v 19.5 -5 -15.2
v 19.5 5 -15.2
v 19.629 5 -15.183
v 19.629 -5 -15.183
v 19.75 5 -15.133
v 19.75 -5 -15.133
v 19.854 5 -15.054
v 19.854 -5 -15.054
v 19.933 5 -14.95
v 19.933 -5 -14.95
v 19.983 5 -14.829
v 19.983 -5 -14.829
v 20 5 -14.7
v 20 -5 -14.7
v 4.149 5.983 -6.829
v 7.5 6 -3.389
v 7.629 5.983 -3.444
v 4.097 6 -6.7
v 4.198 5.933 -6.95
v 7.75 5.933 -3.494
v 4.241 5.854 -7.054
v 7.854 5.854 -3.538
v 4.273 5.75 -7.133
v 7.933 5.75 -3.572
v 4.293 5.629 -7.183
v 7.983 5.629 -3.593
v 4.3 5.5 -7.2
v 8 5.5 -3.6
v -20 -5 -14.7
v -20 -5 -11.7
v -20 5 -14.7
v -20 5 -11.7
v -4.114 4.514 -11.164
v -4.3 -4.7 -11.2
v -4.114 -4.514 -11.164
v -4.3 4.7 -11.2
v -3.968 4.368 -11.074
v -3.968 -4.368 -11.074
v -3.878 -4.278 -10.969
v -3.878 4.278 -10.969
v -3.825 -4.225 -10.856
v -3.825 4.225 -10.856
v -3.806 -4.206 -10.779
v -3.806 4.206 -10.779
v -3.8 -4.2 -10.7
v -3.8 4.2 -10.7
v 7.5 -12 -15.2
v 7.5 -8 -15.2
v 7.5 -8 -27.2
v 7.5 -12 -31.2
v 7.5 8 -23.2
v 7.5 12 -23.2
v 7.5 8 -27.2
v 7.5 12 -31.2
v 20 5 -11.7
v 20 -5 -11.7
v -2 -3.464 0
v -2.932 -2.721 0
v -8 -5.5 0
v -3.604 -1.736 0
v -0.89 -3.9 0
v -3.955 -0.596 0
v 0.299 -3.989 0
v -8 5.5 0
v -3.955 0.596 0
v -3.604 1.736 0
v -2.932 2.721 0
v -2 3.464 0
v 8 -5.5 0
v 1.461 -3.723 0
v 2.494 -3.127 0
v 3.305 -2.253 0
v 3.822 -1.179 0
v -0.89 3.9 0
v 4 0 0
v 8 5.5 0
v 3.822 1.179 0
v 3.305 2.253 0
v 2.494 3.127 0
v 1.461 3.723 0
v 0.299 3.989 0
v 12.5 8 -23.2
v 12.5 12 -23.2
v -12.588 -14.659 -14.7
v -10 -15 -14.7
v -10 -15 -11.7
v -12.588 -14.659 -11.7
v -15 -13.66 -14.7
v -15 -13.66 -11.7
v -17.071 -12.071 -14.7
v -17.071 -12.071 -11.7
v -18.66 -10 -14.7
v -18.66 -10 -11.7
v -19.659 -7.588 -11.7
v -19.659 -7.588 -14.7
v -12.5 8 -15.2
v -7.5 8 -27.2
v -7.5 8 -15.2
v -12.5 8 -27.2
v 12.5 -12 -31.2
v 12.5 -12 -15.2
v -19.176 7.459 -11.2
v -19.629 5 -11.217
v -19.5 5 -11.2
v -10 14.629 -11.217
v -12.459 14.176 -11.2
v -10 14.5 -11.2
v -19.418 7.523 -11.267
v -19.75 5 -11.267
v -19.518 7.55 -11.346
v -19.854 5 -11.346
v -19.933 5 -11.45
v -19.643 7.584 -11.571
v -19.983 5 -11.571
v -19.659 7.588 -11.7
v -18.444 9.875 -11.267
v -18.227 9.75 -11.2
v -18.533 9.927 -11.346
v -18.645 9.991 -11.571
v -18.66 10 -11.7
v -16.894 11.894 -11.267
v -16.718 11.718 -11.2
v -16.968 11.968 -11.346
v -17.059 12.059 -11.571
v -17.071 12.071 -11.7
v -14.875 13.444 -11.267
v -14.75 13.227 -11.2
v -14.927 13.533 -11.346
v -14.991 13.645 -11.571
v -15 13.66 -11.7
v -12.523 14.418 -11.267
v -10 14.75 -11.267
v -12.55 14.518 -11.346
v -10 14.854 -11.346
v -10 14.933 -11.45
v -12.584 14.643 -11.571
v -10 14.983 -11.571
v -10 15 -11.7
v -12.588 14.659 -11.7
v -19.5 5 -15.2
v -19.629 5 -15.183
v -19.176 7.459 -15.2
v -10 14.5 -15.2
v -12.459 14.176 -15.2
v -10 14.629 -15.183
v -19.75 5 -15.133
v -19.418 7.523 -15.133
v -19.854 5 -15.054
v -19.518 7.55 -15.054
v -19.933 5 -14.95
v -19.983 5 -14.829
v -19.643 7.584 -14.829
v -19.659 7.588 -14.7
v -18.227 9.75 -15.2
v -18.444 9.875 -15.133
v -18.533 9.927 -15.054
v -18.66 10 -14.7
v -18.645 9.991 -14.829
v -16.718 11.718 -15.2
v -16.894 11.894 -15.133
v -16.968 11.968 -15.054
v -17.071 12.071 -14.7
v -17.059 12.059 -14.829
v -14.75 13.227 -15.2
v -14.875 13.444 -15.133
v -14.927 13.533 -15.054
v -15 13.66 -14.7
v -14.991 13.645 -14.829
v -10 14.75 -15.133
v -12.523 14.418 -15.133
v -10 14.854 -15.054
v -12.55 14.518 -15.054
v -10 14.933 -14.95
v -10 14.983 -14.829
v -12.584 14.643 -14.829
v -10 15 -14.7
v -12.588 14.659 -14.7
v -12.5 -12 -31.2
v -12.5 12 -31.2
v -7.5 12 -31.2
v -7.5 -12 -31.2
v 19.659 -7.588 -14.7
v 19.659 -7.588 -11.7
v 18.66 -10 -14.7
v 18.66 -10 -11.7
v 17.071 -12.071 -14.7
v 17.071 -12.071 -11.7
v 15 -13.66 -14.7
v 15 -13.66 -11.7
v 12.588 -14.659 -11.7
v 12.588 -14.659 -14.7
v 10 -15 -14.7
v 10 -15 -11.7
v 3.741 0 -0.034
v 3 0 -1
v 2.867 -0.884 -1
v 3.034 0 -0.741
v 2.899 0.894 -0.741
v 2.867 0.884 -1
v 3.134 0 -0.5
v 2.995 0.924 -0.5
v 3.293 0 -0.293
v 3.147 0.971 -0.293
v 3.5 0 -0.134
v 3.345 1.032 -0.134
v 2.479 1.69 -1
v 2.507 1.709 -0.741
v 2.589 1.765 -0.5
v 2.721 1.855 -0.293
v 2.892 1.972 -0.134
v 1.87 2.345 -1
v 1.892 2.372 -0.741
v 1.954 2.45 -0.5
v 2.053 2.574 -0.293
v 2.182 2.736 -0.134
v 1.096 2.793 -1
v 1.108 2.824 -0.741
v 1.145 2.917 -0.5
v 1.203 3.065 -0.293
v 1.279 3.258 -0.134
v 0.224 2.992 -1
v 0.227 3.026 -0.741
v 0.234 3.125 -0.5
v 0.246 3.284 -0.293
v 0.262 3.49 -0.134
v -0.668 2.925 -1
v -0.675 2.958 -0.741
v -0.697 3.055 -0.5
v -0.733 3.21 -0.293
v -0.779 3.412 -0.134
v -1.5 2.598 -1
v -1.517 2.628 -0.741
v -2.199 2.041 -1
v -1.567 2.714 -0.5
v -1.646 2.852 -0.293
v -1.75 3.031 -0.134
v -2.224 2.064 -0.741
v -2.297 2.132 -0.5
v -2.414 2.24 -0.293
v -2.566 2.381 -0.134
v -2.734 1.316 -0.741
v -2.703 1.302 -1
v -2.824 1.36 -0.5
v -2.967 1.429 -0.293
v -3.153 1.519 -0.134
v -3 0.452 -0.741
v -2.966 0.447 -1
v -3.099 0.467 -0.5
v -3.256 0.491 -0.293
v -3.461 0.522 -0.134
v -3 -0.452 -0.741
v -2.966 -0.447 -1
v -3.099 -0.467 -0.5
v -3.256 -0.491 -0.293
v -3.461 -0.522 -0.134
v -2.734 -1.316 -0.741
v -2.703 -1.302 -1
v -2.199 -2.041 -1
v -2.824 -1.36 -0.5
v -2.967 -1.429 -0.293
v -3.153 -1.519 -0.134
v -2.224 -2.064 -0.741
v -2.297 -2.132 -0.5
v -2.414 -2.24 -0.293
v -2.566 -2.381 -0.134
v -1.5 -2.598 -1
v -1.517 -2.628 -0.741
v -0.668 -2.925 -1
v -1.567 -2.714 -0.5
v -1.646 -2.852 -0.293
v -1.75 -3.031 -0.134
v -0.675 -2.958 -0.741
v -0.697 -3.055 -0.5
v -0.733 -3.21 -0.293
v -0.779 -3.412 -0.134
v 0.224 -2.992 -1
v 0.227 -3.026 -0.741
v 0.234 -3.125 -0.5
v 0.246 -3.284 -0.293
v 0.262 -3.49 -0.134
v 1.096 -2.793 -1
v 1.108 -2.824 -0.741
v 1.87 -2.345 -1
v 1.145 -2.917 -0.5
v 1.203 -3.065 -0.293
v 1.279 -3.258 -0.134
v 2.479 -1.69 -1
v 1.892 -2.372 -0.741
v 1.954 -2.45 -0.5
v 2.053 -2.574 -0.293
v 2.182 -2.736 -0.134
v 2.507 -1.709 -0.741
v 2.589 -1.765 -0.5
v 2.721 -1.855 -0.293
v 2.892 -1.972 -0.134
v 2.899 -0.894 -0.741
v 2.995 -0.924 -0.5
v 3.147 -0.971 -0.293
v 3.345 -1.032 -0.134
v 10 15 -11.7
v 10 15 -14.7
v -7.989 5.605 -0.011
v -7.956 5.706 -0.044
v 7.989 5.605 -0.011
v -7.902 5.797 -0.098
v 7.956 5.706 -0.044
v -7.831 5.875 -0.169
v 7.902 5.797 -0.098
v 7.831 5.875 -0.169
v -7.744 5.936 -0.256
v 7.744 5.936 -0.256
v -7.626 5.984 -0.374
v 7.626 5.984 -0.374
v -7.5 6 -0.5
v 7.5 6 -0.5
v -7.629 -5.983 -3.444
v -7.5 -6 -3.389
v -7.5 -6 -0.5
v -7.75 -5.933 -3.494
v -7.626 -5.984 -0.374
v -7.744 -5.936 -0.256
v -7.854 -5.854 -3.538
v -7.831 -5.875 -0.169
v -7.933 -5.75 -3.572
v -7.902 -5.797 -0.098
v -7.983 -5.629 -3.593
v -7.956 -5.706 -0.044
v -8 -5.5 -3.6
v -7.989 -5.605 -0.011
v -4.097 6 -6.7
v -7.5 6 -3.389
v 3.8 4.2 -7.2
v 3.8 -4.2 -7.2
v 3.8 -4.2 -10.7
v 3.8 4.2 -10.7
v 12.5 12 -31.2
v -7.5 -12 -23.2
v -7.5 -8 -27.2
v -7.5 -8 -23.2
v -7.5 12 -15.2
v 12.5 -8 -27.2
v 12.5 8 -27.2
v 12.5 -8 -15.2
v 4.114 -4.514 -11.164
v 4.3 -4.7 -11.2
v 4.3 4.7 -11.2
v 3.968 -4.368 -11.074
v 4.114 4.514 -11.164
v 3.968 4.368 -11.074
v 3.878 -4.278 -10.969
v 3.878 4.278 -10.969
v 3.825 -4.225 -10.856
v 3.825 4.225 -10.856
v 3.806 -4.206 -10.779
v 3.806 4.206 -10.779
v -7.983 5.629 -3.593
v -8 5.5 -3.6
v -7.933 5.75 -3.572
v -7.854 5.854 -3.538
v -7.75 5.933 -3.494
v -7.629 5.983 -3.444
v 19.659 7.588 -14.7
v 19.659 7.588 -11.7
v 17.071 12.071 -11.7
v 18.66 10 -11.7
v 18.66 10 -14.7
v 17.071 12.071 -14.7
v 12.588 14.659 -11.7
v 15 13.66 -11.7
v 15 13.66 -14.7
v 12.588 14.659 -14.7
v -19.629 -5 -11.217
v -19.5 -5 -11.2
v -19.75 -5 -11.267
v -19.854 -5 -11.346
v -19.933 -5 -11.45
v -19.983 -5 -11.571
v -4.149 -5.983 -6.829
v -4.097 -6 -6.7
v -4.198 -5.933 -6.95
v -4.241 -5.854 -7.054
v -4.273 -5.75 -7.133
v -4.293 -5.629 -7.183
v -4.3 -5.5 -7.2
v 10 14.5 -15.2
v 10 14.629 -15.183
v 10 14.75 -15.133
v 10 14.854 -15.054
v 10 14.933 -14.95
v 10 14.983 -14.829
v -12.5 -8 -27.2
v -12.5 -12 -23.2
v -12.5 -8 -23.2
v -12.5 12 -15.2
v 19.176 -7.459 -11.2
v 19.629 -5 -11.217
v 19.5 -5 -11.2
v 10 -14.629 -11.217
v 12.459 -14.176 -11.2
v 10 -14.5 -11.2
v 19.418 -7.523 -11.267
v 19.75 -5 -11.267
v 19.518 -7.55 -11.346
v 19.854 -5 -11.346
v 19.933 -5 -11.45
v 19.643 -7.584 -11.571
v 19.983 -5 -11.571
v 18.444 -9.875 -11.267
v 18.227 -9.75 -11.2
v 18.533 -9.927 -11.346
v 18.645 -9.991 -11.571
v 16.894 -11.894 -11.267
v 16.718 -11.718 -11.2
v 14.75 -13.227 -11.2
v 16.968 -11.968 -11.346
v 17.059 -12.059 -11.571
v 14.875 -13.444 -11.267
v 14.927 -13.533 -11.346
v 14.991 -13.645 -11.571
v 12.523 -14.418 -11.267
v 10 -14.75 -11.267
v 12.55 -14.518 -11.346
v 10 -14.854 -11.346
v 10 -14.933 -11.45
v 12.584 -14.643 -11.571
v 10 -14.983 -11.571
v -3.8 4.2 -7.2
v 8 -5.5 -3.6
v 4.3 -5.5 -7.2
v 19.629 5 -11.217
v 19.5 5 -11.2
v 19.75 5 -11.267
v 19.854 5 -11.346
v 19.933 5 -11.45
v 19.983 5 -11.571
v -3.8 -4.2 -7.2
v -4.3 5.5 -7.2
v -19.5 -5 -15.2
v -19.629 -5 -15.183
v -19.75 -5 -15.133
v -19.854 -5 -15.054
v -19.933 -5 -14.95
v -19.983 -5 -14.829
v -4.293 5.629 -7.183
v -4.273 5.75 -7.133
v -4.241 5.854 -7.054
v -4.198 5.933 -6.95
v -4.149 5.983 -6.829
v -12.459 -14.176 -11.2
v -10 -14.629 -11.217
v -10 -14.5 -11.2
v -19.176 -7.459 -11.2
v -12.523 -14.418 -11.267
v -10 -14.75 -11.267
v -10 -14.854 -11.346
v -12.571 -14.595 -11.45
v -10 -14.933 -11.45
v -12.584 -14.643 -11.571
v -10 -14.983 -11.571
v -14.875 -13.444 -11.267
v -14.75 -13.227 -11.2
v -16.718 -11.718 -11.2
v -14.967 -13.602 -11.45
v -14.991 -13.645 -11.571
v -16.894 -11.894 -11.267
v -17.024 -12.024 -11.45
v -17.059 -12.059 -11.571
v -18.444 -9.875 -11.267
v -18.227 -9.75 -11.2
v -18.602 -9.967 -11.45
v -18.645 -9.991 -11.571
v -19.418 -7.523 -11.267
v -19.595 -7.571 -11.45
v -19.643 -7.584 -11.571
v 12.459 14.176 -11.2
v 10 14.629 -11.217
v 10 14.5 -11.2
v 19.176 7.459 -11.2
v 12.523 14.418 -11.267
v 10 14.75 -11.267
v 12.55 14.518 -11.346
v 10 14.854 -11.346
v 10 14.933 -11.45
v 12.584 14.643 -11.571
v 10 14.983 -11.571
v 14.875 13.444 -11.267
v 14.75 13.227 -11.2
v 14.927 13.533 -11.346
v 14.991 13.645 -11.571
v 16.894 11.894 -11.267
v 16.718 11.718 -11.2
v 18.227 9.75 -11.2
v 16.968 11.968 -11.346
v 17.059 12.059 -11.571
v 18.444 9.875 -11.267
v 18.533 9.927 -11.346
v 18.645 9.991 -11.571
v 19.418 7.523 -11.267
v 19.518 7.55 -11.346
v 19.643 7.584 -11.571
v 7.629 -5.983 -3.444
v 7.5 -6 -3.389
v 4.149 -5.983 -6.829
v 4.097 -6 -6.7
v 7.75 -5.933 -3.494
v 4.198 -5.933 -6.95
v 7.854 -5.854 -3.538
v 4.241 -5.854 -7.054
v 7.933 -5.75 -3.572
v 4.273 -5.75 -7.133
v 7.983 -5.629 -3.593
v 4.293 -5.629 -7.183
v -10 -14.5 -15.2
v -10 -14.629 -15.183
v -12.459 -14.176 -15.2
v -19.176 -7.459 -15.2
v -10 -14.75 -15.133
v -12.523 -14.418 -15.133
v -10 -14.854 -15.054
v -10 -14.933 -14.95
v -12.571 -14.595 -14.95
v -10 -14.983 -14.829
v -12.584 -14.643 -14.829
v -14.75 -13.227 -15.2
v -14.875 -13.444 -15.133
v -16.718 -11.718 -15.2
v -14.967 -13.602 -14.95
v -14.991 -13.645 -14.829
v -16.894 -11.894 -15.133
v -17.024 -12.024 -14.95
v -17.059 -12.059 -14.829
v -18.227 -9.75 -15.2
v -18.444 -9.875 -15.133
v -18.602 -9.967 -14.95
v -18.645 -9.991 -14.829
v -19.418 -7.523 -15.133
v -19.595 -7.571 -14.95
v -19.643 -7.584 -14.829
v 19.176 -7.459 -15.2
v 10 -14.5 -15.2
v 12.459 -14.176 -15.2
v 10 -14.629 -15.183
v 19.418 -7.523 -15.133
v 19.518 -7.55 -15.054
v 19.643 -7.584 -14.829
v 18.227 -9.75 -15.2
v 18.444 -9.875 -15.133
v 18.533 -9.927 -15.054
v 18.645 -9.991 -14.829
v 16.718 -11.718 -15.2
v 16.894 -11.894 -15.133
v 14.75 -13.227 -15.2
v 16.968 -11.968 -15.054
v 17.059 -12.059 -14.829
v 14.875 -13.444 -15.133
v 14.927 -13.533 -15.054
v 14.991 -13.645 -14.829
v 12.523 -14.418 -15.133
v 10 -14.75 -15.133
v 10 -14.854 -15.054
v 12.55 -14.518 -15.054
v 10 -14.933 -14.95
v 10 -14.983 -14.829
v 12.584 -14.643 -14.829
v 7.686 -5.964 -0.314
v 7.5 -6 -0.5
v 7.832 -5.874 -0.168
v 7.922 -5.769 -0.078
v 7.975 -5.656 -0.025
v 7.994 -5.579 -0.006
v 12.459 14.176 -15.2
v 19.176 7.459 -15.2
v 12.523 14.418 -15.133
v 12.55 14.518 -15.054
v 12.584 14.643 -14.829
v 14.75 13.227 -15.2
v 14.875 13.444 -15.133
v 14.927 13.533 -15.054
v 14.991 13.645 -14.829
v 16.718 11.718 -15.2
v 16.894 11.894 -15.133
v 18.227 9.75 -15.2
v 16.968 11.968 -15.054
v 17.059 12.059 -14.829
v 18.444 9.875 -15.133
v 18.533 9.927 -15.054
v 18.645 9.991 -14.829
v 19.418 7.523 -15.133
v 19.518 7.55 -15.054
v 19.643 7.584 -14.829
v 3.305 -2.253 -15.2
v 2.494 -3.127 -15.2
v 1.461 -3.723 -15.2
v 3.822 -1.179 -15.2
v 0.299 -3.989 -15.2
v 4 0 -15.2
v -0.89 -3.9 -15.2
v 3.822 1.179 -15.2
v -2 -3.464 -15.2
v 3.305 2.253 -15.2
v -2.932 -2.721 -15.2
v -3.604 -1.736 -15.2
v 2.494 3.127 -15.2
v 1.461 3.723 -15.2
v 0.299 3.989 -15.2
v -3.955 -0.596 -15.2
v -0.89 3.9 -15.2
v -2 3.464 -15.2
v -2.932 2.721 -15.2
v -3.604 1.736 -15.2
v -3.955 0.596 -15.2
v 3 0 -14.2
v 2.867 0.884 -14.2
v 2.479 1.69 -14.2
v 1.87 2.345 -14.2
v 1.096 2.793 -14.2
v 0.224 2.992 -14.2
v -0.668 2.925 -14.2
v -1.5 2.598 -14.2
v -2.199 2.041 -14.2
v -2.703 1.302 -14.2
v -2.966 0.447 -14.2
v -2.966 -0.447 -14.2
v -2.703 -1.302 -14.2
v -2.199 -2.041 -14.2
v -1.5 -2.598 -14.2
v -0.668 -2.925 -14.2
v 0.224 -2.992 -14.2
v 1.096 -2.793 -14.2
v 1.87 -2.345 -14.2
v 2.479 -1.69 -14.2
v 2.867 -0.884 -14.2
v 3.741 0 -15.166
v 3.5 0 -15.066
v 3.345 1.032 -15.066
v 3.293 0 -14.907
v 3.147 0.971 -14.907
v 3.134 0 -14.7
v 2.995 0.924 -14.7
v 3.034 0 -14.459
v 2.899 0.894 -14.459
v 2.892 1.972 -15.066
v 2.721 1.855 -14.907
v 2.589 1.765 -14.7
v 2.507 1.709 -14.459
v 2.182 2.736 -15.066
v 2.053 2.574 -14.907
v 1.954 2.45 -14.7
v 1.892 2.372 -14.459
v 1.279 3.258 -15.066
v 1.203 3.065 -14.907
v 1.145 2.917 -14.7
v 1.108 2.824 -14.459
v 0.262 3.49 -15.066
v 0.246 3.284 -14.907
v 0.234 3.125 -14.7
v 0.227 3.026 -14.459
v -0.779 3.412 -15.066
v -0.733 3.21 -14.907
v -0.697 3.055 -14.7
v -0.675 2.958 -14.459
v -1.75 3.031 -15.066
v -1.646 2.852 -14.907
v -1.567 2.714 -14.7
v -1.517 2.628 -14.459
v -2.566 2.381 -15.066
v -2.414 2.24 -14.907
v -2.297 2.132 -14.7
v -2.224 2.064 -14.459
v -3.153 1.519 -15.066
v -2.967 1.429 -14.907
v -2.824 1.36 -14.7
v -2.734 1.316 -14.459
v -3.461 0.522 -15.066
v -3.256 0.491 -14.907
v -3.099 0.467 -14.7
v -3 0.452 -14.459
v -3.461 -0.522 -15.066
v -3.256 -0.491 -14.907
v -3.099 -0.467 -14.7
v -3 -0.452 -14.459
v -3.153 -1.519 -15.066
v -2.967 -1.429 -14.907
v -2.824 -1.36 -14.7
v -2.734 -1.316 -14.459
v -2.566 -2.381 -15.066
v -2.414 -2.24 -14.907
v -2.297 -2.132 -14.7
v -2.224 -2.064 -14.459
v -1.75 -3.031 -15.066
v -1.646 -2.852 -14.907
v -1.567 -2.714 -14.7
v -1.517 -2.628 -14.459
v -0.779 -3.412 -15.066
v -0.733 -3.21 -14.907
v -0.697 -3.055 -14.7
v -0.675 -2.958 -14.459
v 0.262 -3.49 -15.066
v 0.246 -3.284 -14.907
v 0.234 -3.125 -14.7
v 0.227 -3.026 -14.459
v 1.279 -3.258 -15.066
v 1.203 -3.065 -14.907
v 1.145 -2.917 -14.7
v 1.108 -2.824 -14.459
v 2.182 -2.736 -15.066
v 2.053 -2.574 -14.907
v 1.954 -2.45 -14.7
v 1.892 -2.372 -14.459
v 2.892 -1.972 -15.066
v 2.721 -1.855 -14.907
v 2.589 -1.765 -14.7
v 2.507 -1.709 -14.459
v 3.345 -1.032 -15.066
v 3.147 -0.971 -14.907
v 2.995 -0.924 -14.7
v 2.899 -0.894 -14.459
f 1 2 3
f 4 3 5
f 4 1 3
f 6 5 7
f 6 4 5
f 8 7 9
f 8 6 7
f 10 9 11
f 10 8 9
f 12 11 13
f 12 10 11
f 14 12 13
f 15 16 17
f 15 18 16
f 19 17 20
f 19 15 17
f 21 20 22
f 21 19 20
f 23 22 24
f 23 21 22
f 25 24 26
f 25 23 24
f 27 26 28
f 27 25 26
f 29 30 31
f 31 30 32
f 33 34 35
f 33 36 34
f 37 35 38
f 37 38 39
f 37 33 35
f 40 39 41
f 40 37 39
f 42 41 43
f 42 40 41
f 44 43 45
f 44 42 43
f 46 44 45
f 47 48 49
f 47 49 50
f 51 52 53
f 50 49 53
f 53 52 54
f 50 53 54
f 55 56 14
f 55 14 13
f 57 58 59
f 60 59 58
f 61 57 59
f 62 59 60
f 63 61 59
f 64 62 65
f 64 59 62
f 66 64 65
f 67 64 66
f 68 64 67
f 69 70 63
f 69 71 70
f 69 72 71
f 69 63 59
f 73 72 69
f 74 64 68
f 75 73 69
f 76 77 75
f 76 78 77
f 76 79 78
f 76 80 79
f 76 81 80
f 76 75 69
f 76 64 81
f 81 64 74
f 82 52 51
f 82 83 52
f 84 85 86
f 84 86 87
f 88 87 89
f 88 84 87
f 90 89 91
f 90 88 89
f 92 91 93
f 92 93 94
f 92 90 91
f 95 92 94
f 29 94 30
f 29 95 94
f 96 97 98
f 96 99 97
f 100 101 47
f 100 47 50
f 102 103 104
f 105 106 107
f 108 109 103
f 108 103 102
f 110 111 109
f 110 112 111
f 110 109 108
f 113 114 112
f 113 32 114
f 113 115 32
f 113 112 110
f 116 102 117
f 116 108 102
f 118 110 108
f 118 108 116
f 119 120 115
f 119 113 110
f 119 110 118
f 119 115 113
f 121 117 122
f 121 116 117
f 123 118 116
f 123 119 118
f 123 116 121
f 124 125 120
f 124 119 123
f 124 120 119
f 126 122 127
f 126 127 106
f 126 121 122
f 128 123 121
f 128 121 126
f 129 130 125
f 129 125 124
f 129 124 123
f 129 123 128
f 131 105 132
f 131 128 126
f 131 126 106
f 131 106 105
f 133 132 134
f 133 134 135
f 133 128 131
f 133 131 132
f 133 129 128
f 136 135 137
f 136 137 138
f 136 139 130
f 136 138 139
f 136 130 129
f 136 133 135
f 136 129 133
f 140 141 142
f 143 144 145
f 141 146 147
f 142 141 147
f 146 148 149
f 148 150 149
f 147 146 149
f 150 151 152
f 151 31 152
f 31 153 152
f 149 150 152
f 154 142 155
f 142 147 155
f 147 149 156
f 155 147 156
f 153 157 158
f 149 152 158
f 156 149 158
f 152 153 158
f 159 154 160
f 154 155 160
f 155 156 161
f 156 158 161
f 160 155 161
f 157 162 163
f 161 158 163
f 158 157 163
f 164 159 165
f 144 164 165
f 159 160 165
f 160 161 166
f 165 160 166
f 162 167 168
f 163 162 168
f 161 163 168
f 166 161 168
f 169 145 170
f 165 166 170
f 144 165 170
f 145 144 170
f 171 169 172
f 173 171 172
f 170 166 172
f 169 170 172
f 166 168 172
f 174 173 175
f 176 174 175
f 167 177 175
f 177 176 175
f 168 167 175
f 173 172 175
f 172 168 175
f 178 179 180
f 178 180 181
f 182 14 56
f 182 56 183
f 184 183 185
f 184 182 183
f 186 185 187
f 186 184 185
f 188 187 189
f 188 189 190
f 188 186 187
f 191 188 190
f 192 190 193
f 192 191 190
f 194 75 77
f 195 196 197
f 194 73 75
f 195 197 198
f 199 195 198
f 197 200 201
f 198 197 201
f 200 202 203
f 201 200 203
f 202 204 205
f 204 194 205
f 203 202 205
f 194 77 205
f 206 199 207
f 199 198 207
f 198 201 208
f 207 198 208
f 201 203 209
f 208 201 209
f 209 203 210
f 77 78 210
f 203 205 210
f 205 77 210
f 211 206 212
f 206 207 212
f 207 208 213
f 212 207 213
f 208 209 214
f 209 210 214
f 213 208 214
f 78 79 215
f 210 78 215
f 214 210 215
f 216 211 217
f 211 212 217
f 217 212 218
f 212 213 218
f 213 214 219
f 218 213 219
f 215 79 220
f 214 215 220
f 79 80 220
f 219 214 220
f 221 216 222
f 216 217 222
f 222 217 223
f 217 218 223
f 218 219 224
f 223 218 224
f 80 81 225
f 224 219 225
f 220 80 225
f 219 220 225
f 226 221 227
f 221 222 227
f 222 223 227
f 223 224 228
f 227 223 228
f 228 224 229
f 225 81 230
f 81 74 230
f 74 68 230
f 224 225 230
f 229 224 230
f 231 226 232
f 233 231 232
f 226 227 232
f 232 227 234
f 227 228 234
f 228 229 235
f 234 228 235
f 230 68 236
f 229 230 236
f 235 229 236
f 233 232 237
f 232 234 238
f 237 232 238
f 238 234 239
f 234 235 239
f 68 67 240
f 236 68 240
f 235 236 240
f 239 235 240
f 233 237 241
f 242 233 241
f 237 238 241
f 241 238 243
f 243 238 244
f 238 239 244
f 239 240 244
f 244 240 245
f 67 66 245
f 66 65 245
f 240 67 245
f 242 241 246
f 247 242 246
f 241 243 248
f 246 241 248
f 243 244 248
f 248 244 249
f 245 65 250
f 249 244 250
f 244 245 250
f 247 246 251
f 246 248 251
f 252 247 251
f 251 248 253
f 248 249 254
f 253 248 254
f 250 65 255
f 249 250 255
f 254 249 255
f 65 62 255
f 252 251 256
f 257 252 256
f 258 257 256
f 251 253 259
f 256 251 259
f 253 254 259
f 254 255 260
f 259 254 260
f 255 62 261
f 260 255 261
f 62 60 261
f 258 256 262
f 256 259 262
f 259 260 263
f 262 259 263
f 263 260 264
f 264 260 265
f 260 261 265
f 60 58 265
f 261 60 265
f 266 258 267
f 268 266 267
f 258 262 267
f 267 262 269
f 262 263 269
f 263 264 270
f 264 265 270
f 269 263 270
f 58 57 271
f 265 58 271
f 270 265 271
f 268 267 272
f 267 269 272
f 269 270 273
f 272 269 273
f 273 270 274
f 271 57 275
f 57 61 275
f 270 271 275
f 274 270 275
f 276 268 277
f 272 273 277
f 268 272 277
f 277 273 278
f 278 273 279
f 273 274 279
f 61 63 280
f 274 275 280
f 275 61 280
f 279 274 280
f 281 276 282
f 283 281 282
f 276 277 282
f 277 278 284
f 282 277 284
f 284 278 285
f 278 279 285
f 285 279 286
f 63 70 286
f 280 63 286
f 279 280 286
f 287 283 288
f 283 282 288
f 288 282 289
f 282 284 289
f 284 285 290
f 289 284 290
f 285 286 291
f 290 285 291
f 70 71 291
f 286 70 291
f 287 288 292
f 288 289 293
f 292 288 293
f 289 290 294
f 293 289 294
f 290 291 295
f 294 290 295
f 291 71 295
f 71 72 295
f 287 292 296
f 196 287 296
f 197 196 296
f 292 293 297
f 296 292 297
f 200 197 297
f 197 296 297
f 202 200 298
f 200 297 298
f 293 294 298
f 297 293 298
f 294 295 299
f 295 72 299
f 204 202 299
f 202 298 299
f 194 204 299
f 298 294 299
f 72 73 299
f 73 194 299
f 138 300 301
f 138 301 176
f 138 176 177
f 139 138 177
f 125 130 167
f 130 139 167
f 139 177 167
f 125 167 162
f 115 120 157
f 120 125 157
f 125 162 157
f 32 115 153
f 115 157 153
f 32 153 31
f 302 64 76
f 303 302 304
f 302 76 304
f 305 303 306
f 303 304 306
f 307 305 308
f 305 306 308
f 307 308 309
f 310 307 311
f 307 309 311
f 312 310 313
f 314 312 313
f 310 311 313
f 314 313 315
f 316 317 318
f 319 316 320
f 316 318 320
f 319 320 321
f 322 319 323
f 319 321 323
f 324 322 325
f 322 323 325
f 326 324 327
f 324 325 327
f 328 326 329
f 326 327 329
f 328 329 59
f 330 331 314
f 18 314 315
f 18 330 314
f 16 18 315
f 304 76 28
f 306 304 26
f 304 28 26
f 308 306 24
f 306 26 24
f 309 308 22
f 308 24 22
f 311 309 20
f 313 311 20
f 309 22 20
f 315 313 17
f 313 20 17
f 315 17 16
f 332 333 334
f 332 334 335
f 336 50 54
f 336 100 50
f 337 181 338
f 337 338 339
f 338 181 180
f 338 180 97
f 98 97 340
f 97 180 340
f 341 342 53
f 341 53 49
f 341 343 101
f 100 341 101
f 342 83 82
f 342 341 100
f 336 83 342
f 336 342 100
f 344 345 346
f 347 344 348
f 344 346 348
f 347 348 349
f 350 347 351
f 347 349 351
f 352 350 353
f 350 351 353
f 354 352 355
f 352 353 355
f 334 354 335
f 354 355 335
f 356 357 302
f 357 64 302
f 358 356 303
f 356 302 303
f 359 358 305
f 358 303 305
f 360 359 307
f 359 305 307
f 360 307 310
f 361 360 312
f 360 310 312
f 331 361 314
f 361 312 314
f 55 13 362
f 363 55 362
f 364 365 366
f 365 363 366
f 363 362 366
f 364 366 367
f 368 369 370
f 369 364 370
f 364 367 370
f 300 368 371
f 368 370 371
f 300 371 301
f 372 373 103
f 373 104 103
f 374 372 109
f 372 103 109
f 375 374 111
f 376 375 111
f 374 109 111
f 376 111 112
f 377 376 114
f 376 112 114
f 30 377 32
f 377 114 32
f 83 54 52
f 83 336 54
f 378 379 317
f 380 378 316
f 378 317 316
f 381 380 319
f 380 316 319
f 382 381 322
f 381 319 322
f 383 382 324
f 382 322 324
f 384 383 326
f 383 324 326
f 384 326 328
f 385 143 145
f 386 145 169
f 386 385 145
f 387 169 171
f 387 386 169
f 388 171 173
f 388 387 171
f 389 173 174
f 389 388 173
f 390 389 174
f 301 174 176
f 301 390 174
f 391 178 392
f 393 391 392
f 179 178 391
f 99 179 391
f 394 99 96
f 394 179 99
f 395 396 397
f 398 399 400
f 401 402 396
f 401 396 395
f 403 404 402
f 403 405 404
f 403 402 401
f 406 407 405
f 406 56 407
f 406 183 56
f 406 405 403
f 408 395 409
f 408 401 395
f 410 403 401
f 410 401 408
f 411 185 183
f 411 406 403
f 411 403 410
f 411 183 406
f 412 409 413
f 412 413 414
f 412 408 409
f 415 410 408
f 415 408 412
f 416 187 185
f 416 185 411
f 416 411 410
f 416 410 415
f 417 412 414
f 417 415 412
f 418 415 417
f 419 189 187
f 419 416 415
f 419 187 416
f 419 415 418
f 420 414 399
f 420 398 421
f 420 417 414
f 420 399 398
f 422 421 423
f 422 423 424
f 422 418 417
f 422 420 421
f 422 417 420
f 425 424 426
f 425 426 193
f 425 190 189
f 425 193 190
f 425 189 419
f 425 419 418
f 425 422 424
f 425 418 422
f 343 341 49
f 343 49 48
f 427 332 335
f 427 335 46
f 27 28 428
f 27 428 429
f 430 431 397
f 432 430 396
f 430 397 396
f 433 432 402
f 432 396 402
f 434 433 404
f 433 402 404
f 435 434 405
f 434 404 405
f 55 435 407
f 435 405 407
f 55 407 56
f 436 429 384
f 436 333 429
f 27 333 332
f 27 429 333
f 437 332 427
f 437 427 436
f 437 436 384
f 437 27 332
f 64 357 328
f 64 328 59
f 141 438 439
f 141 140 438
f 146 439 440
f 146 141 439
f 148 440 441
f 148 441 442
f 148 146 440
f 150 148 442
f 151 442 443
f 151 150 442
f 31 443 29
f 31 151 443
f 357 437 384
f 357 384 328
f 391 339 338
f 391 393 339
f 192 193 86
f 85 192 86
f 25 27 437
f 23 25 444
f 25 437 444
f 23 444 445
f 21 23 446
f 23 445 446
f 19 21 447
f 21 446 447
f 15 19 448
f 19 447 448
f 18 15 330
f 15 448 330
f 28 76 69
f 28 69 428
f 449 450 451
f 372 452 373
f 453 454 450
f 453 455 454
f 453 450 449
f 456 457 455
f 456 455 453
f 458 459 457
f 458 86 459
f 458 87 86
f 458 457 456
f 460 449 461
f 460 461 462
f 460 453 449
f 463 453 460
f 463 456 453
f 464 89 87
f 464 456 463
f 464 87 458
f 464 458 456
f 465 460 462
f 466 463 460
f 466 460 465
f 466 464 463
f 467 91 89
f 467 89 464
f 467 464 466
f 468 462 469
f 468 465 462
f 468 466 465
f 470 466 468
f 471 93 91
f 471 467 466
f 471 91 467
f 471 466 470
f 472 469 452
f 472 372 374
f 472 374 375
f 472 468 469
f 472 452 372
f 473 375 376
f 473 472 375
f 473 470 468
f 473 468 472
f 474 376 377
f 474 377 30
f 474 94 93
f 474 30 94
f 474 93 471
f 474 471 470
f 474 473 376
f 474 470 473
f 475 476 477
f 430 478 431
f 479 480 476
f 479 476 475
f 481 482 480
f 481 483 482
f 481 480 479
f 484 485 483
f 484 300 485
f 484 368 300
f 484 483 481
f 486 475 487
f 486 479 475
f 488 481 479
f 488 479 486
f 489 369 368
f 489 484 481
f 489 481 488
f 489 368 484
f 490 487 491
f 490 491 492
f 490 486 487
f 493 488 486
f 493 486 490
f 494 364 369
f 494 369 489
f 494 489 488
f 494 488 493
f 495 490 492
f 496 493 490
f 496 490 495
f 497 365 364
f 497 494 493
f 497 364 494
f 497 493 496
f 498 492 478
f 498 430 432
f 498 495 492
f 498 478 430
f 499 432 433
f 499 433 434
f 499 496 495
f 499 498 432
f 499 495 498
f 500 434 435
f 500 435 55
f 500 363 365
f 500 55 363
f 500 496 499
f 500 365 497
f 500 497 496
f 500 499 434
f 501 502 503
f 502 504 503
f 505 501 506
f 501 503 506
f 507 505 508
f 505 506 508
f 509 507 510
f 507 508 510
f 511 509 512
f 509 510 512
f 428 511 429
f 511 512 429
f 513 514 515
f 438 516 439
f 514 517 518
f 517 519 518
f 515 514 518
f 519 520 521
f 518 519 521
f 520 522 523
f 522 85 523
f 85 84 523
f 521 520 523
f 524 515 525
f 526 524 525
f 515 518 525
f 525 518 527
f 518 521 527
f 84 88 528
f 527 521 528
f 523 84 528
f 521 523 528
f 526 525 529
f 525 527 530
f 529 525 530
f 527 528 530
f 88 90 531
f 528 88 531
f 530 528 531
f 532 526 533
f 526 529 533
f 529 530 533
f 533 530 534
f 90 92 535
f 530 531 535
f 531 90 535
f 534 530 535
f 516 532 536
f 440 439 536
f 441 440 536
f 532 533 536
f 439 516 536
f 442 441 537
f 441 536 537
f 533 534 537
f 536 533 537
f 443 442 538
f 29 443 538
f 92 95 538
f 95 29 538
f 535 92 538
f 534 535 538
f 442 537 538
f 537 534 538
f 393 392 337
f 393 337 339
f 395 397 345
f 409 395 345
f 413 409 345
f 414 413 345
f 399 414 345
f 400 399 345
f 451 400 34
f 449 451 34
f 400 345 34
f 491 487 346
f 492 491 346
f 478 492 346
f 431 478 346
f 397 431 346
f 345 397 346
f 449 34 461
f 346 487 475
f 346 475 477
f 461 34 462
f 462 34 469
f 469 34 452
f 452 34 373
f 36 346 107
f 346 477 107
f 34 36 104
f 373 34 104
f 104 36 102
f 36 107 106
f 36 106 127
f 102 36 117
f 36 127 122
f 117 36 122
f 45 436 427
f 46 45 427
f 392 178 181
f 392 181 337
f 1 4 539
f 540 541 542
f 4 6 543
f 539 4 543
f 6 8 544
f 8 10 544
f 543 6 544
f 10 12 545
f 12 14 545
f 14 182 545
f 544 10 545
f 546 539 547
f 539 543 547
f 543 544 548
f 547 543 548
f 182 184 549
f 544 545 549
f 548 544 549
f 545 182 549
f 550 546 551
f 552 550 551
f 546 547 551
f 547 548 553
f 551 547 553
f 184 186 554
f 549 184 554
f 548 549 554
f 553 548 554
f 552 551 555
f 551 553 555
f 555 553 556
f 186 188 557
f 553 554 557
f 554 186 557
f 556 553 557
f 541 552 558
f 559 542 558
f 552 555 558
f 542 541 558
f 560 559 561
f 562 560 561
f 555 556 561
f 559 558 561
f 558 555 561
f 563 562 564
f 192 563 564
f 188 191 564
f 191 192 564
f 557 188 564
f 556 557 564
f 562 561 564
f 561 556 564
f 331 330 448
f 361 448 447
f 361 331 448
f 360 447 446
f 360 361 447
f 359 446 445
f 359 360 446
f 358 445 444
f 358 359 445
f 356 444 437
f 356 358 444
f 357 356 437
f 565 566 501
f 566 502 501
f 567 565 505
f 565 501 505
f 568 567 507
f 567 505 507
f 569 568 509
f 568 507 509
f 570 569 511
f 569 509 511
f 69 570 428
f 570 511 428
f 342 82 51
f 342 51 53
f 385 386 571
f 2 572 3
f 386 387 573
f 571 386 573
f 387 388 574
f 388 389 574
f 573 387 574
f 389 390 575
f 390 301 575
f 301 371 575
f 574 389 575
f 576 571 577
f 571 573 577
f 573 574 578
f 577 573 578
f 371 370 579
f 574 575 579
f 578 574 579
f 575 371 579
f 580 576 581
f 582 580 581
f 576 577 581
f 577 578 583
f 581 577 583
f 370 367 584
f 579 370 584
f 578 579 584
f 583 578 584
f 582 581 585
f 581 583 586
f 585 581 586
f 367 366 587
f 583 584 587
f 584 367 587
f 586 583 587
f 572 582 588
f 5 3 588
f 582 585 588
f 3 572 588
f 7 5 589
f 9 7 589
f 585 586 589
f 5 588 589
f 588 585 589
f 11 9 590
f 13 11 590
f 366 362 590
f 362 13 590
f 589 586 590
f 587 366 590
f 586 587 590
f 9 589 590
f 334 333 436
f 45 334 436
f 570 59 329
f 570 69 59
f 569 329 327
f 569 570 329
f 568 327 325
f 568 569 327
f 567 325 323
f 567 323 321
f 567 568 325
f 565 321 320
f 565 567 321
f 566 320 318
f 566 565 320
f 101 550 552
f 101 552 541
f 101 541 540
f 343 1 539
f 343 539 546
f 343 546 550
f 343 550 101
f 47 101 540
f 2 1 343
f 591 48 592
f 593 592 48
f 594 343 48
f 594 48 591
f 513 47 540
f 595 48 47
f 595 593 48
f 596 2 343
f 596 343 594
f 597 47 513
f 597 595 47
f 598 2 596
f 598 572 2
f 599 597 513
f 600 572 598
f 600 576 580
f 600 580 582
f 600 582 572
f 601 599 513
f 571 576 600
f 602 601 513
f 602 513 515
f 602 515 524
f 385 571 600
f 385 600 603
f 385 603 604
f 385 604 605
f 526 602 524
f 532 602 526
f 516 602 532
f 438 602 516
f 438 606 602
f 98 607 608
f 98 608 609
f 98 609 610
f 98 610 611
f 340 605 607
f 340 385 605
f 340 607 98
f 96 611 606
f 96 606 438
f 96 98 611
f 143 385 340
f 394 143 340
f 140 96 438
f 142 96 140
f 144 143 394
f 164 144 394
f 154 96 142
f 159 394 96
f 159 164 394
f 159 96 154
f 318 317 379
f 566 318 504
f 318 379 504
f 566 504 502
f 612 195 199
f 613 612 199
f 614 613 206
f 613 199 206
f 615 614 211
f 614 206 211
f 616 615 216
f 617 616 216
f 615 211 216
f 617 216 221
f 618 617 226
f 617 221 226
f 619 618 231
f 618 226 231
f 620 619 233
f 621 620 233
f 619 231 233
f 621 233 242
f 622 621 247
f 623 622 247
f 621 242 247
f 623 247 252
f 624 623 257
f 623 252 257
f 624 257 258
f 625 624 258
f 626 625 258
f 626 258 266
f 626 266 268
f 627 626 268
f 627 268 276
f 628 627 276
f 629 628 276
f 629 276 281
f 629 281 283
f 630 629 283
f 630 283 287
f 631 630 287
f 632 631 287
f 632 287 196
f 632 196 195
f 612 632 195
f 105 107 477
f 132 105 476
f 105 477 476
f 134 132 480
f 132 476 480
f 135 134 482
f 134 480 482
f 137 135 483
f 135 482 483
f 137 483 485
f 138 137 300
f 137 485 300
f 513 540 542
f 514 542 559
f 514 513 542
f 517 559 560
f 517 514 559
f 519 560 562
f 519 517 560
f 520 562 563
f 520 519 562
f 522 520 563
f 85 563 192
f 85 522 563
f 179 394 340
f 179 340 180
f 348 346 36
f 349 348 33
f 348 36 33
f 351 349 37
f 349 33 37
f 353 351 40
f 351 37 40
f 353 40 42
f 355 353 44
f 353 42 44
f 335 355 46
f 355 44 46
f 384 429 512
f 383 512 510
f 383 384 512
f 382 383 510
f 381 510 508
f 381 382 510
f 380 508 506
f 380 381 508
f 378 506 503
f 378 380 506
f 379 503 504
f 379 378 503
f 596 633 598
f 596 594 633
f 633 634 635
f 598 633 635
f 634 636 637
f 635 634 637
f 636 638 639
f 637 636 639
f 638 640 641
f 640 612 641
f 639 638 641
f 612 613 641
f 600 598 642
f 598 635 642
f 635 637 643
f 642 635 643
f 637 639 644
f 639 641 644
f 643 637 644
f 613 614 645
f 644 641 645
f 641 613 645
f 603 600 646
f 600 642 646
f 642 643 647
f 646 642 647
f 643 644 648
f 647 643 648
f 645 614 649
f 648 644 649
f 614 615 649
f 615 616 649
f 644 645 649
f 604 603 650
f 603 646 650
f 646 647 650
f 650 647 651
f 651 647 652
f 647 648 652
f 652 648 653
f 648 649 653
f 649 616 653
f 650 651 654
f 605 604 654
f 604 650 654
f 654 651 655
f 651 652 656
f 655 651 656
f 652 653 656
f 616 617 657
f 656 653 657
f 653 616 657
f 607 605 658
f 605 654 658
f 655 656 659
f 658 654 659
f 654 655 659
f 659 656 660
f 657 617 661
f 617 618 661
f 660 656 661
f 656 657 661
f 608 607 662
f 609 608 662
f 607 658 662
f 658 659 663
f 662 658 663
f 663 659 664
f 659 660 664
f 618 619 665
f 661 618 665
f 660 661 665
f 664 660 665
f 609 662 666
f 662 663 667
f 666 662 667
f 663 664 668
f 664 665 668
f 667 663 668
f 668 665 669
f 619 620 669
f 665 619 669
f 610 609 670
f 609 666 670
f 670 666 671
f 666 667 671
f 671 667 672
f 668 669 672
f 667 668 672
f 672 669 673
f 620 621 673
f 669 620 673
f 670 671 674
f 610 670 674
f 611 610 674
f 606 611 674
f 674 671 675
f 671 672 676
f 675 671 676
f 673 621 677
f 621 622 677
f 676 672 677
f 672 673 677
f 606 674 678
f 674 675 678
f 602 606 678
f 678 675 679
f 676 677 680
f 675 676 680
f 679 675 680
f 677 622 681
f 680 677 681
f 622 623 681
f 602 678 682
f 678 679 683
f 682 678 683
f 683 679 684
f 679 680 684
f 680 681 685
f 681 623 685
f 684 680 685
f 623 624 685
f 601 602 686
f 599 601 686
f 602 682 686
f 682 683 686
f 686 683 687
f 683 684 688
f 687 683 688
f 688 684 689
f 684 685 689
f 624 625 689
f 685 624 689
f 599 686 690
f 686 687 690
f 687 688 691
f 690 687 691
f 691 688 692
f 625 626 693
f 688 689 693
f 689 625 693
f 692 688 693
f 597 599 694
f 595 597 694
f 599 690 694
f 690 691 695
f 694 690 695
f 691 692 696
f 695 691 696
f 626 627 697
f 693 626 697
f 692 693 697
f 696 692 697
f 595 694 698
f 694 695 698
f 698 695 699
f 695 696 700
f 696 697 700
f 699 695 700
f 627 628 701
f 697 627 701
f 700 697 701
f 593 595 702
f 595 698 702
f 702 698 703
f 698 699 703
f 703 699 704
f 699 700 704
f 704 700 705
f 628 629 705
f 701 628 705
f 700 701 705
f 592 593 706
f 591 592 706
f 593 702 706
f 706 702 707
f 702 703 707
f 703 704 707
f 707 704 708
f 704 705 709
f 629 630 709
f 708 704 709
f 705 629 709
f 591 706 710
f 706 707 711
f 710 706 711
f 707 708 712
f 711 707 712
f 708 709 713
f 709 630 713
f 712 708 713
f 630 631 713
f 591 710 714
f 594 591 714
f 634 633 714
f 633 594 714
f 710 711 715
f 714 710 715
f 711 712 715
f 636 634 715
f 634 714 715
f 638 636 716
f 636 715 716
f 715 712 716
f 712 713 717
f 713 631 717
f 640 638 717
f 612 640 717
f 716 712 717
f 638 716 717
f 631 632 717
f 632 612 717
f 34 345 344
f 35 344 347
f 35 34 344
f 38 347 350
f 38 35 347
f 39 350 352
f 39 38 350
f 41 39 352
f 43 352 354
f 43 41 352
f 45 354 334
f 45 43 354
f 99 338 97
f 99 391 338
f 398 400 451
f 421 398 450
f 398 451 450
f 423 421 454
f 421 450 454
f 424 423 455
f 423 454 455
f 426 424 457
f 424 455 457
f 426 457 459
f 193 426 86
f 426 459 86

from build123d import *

# Parameters (mm, degrees)
BOSS_EXTRUDE1_DEPTH = 6
SKETCH2_W           = 7.6
SKETCH2_H           = 8.4
BOSS_EXTRUDE2_DEPTH = 4
SKETCH3_W           = 40
SKETCH3_H           = 30
BOSS_EXTRUDE3_DEPTH = 4
BOSS_EXTRUDE4_DEPTH = 2.5
BOSS_EXTRUDE5_DEPTH = 2.5
FILLET1_R           = 10
SKETCH8_R           = 3
CUT_EXTRUDE1_DEPTH  = 32.2
FILLET2_R           = 1
FILLET3_R           = 0.5
FILLET4_R           = 0.5
FILLET5_R           = 0.5


with BuildPart() as part:
    # Sketch1 → Boss-Extrude1 (new body, symmetric)
    with BuildSketch(Plane(origin=(0, 0, 0), x_dir=(1, 0, 0), z_dir=(0, 1, 0))):
        Polygon((-8, 0), (8, 0), (8, 3.6), (4.3, 7.2), (-4.3, 7.2), (-8, 3.6), align=None)
    extrude(amount=BOSS_EXTRUDE1_DEPTH, both=True)

    # Sketch2 → Boss-Extrude2 (add)
    with BuildSketch(Plane(origin=(0, 0, -7.2), x_dir=(-1, 0, 0), z_dir=(0, 0, -1))):
        Rectangle(SKETCH2_W, SKETCH2_H)
    extrude(amount=BOSS_EXTRUDE2_DEPTH)

    # Sketch3 → Boss-Extrude3 (add)
    with BuildSketch(Plane(origin=(0, 0, -11.2), x_dir=(-1, 0, 0), z_dir=(0, 0, -1))):
        Rectangle(SKETCH3_W, SKETCH3_H)
    extrude(amount=BOSS_EXTRUDE3_DEPTH)

    # Sketch6 → Boss-Extrude4 (add, symmetric)
    with BuildSketch(Plane.ZY.offset(10)):
        Polygon((-27.2, 8), (-15.2, 8), (-15.2, 12), (-31.2, 12), (-31.2, -12), (-23.2, -12), (-23.2, -8), (-27.2, -8), align=None)
    extrude(amount=BOSS_EXTRUDE4_DEPTH, both=True)

    # Sketch7 → Boss-Extrude5 (add, symmetric)
    with BuildSketch(Plane(origin=(10, 0, 0), x_dir=(0, 0, -1), z_dir=(1, 0, 0))):
        Polygon((23.2, 12), (23.2, 8), (27.2, 8), (27.2, -8), (15.2, -8), (15.2, -12), (31.2, -12), (31.2, 12), align=None)
    extrude(amount=BOSS_EXTRUDE5_DEPTH, both=True)

    # Fillet1
    fillet1_edges = [part.edges().sort_by_distance(p)[0] for p in [
        (-20, -15, -13.2),
        (-20, 15, -13.2),
        (20, 15, -13.2),
        (20, -15, -13.2),
    ]]
    fillet(fillet1_edges, radius=FILLET1_R)

    # Sketch8 → Cut-Extrude1 (cut, through all)
    with BuildSketch(Plane.XY):
        Circle(SKETCH8_R)
    extrude(amount=-CUT_EXTRUDE1_DEPTH, mode=Mode.SUBTRACT)

    # Fillet2
    fillet2_edges = [part.edges().sort_by_distance(p)[0] for p in [
        (-3, 0, -15.2),
        (-3, 0, 0),
    ]]
    fillet(fillet2_edges, radius=FILLET2_R)

    # Fillet3
    fillet3_edges = [part.edges().sort_by_distance(p)[0] for p in [
        (-6.15, 6, -5.4),
        (-8, 6, -1.8),
        (0, 6, 0),
        (8, 6, -1.8),
        (6.15, 6, -5.4),
        (8, -6, -1.8),
        (0, -6, 0),
        (-8, -6, -1.8),
        (-6.15, -6, -5.4),
        (0, -6, -7.2),
        (6.15, -6, -5.4),
        (0, 6, -7.2),
    ]]
    fillet(fillet3_edges, radius=FILLET3_R)

    # Fillet4
    fillet4_edges = [part.edges().sort_by_distance(p)[0] for p in [
        (-20, 0, -11.2),
        (-20, 0, -15.2),
        (0, -15, -11.2),
        (20, 0, -11.2),
        (0, 15, -11.2),
        (17.071067812, 12.071067812, -11.2),
        (17.071067812, -12.071067812, -11.2),
        (-17.071067812, 12.071067812, -11.2),
        (-17.071067812, -12.071067812, -11.2),
        (0, -15, -15.2),
        (0, 15, -15.2),
        (20, 0, -15.2),
        (17.071067812, 12.071067812, -15.2),
        (17.071067812, -12.071067812, -15.2),
        (-17.071067812, 12.071067812, -15.2),
        (-17.071067812, -12.071067812, -15.2),
    ]]
    fillet(fillet4_edges, radius=FILLET4_R)

    # Fillet5
    fillet5_edges = [part.edges().sort_by_distance(p)[0] for p in [
        (-3.8, 0, -11.2),
        (0, 4.2, -11.2),
        (3.8, 0, -11.2),
        (0, -4.2, -11.2),
    ]]
    fillet(fillet5_edges, radius=FILLET5_R)


solid = part.part
